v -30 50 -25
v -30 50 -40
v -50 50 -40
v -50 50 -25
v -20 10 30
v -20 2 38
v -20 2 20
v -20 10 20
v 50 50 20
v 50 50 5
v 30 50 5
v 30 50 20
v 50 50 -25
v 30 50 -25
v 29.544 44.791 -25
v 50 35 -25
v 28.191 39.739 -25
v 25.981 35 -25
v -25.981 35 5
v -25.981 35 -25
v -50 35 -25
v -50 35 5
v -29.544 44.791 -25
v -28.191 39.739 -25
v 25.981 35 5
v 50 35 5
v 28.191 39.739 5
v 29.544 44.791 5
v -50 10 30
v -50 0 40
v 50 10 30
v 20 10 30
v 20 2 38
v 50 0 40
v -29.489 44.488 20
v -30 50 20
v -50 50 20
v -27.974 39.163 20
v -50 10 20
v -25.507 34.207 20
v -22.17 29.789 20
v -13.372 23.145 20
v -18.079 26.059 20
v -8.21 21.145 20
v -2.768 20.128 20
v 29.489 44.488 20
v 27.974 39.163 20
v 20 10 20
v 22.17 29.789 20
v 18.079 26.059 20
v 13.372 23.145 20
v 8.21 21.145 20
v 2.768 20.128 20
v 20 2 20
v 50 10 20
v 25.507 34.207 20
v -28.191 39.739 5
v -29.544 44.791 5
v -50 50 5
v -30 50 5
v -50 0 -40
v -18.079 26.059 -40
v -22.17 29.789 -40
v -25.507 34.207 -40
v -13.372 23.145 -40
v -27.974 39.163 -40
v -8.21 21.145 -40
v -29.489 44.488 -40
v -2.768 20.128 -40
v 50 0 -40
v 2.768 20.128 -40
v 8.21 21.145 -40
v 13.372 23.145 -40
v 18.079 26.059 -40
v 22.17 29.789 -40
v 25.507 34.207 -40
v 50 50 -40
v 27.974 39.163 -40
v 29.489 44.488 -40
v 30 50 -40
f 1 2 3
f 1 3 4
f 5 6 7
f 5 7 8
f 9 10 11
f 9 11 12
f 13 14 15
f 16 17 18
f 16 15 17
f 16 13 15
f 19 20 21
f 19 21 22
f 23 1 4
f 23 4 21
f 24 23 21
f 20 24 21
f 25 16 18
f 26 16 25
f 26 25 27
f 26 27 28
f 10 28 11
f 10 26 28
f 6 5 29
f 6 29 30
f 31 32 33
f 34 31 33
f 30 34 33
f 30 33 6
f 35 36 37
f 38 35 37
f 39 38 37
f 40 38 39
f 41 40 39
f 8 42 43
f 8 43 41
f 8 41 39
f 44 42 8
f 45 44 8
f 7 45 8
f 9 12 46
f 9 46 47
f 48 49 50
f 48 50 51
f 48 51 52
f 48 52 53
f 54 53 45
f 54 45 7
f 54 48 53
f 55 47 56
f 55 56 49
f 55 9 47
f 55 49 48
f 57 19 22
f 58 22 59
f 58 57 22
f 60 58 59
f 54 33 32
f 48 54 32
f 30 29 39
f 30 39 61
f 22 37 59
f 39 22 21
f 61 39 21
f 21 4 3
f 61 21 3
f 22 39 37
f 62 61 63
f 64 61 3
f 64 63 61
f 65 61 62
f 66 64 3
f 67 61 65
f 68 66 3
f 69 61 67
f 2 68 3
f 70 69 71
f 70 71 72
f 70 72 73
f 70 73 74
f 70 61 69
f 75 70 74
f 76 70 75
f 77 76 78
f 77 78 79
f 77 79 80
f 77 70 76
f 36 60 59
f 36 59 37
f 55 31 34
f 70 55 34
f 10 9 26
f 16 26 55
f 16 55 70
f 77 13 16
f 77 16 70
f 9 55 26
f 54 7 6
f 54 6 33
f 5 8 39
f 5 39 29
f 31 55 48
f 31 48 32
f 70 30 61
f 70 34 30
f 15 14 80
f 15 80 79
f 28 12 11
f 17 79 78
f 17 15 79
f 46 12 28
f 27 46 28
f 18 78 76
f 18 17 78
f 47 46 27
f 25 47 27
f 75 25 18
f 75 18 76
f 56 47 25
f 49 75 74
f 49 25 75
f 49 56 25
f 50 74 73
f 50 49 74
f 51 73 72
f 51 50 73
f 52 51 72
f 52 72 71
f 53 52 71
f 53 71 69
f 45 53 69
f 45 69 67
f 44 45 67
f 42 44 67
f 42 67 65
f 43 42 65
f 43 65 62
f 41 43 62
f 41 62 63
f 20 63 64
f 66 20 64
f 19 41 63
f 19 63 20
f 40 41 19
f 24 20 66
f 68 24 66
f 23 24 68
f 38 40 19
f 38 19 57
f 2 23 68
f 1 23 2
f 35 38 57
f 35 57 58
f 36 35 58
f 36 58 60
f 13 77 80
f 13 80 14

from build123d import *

# Parameters (mm, degrees)
BOSS_EXTRUDE1_DEPTH = 50
CUT_EXTRUDE1_DEPTH  = 100
SKETCH3_W           = 40
SKETCH3_H           = 8
CUT_EXTRUDE2_DEPTH  = 100


with BuildPart() as part:
    # Sketch1 → Boss-Extrude1 (new body, symmetric)
    with BuildSketch(Plane(origin=(0, 0, 0), x_dir=(0, 0, -1), z_dir=(1, 0, 0))):
        Polygon((-40, 0), (40, 0), (40, 50), (25, 50), (25, 35), (-5, 35), (-5, 50), (-20, 50), (-20, 10), (-30, 10), align=None)
    extrude(amount=BOSS_EXTRUDE1_DEPTH, both=True)

    # Sketch2 → Cut-Extrude1 (cut)
    with BuildSketch(Plane.XY.offset(20)):
        with BuildLine():
            Line((-30, 50), (30, 50))
            ThreePointArc((30, 50), (0, 20), (-30, 50))
        make_face()
    extrude(amount=-CUT_EXTRUDE1_DEPTH, mode=Mode.SUBTRACT)

    # Sketch3 → Cut-Extrude2 (cut)
    with BuildSketch(Plane.XY.offset(20)):
        with Locations((0, 6)):
            Rectangle(SKETCH3_W, SKETCH3_H)
    extrude(amount=CUT_EXTRUDE2_DEPTH, mode=Mode.SUBTRACT)


solid = part.part
